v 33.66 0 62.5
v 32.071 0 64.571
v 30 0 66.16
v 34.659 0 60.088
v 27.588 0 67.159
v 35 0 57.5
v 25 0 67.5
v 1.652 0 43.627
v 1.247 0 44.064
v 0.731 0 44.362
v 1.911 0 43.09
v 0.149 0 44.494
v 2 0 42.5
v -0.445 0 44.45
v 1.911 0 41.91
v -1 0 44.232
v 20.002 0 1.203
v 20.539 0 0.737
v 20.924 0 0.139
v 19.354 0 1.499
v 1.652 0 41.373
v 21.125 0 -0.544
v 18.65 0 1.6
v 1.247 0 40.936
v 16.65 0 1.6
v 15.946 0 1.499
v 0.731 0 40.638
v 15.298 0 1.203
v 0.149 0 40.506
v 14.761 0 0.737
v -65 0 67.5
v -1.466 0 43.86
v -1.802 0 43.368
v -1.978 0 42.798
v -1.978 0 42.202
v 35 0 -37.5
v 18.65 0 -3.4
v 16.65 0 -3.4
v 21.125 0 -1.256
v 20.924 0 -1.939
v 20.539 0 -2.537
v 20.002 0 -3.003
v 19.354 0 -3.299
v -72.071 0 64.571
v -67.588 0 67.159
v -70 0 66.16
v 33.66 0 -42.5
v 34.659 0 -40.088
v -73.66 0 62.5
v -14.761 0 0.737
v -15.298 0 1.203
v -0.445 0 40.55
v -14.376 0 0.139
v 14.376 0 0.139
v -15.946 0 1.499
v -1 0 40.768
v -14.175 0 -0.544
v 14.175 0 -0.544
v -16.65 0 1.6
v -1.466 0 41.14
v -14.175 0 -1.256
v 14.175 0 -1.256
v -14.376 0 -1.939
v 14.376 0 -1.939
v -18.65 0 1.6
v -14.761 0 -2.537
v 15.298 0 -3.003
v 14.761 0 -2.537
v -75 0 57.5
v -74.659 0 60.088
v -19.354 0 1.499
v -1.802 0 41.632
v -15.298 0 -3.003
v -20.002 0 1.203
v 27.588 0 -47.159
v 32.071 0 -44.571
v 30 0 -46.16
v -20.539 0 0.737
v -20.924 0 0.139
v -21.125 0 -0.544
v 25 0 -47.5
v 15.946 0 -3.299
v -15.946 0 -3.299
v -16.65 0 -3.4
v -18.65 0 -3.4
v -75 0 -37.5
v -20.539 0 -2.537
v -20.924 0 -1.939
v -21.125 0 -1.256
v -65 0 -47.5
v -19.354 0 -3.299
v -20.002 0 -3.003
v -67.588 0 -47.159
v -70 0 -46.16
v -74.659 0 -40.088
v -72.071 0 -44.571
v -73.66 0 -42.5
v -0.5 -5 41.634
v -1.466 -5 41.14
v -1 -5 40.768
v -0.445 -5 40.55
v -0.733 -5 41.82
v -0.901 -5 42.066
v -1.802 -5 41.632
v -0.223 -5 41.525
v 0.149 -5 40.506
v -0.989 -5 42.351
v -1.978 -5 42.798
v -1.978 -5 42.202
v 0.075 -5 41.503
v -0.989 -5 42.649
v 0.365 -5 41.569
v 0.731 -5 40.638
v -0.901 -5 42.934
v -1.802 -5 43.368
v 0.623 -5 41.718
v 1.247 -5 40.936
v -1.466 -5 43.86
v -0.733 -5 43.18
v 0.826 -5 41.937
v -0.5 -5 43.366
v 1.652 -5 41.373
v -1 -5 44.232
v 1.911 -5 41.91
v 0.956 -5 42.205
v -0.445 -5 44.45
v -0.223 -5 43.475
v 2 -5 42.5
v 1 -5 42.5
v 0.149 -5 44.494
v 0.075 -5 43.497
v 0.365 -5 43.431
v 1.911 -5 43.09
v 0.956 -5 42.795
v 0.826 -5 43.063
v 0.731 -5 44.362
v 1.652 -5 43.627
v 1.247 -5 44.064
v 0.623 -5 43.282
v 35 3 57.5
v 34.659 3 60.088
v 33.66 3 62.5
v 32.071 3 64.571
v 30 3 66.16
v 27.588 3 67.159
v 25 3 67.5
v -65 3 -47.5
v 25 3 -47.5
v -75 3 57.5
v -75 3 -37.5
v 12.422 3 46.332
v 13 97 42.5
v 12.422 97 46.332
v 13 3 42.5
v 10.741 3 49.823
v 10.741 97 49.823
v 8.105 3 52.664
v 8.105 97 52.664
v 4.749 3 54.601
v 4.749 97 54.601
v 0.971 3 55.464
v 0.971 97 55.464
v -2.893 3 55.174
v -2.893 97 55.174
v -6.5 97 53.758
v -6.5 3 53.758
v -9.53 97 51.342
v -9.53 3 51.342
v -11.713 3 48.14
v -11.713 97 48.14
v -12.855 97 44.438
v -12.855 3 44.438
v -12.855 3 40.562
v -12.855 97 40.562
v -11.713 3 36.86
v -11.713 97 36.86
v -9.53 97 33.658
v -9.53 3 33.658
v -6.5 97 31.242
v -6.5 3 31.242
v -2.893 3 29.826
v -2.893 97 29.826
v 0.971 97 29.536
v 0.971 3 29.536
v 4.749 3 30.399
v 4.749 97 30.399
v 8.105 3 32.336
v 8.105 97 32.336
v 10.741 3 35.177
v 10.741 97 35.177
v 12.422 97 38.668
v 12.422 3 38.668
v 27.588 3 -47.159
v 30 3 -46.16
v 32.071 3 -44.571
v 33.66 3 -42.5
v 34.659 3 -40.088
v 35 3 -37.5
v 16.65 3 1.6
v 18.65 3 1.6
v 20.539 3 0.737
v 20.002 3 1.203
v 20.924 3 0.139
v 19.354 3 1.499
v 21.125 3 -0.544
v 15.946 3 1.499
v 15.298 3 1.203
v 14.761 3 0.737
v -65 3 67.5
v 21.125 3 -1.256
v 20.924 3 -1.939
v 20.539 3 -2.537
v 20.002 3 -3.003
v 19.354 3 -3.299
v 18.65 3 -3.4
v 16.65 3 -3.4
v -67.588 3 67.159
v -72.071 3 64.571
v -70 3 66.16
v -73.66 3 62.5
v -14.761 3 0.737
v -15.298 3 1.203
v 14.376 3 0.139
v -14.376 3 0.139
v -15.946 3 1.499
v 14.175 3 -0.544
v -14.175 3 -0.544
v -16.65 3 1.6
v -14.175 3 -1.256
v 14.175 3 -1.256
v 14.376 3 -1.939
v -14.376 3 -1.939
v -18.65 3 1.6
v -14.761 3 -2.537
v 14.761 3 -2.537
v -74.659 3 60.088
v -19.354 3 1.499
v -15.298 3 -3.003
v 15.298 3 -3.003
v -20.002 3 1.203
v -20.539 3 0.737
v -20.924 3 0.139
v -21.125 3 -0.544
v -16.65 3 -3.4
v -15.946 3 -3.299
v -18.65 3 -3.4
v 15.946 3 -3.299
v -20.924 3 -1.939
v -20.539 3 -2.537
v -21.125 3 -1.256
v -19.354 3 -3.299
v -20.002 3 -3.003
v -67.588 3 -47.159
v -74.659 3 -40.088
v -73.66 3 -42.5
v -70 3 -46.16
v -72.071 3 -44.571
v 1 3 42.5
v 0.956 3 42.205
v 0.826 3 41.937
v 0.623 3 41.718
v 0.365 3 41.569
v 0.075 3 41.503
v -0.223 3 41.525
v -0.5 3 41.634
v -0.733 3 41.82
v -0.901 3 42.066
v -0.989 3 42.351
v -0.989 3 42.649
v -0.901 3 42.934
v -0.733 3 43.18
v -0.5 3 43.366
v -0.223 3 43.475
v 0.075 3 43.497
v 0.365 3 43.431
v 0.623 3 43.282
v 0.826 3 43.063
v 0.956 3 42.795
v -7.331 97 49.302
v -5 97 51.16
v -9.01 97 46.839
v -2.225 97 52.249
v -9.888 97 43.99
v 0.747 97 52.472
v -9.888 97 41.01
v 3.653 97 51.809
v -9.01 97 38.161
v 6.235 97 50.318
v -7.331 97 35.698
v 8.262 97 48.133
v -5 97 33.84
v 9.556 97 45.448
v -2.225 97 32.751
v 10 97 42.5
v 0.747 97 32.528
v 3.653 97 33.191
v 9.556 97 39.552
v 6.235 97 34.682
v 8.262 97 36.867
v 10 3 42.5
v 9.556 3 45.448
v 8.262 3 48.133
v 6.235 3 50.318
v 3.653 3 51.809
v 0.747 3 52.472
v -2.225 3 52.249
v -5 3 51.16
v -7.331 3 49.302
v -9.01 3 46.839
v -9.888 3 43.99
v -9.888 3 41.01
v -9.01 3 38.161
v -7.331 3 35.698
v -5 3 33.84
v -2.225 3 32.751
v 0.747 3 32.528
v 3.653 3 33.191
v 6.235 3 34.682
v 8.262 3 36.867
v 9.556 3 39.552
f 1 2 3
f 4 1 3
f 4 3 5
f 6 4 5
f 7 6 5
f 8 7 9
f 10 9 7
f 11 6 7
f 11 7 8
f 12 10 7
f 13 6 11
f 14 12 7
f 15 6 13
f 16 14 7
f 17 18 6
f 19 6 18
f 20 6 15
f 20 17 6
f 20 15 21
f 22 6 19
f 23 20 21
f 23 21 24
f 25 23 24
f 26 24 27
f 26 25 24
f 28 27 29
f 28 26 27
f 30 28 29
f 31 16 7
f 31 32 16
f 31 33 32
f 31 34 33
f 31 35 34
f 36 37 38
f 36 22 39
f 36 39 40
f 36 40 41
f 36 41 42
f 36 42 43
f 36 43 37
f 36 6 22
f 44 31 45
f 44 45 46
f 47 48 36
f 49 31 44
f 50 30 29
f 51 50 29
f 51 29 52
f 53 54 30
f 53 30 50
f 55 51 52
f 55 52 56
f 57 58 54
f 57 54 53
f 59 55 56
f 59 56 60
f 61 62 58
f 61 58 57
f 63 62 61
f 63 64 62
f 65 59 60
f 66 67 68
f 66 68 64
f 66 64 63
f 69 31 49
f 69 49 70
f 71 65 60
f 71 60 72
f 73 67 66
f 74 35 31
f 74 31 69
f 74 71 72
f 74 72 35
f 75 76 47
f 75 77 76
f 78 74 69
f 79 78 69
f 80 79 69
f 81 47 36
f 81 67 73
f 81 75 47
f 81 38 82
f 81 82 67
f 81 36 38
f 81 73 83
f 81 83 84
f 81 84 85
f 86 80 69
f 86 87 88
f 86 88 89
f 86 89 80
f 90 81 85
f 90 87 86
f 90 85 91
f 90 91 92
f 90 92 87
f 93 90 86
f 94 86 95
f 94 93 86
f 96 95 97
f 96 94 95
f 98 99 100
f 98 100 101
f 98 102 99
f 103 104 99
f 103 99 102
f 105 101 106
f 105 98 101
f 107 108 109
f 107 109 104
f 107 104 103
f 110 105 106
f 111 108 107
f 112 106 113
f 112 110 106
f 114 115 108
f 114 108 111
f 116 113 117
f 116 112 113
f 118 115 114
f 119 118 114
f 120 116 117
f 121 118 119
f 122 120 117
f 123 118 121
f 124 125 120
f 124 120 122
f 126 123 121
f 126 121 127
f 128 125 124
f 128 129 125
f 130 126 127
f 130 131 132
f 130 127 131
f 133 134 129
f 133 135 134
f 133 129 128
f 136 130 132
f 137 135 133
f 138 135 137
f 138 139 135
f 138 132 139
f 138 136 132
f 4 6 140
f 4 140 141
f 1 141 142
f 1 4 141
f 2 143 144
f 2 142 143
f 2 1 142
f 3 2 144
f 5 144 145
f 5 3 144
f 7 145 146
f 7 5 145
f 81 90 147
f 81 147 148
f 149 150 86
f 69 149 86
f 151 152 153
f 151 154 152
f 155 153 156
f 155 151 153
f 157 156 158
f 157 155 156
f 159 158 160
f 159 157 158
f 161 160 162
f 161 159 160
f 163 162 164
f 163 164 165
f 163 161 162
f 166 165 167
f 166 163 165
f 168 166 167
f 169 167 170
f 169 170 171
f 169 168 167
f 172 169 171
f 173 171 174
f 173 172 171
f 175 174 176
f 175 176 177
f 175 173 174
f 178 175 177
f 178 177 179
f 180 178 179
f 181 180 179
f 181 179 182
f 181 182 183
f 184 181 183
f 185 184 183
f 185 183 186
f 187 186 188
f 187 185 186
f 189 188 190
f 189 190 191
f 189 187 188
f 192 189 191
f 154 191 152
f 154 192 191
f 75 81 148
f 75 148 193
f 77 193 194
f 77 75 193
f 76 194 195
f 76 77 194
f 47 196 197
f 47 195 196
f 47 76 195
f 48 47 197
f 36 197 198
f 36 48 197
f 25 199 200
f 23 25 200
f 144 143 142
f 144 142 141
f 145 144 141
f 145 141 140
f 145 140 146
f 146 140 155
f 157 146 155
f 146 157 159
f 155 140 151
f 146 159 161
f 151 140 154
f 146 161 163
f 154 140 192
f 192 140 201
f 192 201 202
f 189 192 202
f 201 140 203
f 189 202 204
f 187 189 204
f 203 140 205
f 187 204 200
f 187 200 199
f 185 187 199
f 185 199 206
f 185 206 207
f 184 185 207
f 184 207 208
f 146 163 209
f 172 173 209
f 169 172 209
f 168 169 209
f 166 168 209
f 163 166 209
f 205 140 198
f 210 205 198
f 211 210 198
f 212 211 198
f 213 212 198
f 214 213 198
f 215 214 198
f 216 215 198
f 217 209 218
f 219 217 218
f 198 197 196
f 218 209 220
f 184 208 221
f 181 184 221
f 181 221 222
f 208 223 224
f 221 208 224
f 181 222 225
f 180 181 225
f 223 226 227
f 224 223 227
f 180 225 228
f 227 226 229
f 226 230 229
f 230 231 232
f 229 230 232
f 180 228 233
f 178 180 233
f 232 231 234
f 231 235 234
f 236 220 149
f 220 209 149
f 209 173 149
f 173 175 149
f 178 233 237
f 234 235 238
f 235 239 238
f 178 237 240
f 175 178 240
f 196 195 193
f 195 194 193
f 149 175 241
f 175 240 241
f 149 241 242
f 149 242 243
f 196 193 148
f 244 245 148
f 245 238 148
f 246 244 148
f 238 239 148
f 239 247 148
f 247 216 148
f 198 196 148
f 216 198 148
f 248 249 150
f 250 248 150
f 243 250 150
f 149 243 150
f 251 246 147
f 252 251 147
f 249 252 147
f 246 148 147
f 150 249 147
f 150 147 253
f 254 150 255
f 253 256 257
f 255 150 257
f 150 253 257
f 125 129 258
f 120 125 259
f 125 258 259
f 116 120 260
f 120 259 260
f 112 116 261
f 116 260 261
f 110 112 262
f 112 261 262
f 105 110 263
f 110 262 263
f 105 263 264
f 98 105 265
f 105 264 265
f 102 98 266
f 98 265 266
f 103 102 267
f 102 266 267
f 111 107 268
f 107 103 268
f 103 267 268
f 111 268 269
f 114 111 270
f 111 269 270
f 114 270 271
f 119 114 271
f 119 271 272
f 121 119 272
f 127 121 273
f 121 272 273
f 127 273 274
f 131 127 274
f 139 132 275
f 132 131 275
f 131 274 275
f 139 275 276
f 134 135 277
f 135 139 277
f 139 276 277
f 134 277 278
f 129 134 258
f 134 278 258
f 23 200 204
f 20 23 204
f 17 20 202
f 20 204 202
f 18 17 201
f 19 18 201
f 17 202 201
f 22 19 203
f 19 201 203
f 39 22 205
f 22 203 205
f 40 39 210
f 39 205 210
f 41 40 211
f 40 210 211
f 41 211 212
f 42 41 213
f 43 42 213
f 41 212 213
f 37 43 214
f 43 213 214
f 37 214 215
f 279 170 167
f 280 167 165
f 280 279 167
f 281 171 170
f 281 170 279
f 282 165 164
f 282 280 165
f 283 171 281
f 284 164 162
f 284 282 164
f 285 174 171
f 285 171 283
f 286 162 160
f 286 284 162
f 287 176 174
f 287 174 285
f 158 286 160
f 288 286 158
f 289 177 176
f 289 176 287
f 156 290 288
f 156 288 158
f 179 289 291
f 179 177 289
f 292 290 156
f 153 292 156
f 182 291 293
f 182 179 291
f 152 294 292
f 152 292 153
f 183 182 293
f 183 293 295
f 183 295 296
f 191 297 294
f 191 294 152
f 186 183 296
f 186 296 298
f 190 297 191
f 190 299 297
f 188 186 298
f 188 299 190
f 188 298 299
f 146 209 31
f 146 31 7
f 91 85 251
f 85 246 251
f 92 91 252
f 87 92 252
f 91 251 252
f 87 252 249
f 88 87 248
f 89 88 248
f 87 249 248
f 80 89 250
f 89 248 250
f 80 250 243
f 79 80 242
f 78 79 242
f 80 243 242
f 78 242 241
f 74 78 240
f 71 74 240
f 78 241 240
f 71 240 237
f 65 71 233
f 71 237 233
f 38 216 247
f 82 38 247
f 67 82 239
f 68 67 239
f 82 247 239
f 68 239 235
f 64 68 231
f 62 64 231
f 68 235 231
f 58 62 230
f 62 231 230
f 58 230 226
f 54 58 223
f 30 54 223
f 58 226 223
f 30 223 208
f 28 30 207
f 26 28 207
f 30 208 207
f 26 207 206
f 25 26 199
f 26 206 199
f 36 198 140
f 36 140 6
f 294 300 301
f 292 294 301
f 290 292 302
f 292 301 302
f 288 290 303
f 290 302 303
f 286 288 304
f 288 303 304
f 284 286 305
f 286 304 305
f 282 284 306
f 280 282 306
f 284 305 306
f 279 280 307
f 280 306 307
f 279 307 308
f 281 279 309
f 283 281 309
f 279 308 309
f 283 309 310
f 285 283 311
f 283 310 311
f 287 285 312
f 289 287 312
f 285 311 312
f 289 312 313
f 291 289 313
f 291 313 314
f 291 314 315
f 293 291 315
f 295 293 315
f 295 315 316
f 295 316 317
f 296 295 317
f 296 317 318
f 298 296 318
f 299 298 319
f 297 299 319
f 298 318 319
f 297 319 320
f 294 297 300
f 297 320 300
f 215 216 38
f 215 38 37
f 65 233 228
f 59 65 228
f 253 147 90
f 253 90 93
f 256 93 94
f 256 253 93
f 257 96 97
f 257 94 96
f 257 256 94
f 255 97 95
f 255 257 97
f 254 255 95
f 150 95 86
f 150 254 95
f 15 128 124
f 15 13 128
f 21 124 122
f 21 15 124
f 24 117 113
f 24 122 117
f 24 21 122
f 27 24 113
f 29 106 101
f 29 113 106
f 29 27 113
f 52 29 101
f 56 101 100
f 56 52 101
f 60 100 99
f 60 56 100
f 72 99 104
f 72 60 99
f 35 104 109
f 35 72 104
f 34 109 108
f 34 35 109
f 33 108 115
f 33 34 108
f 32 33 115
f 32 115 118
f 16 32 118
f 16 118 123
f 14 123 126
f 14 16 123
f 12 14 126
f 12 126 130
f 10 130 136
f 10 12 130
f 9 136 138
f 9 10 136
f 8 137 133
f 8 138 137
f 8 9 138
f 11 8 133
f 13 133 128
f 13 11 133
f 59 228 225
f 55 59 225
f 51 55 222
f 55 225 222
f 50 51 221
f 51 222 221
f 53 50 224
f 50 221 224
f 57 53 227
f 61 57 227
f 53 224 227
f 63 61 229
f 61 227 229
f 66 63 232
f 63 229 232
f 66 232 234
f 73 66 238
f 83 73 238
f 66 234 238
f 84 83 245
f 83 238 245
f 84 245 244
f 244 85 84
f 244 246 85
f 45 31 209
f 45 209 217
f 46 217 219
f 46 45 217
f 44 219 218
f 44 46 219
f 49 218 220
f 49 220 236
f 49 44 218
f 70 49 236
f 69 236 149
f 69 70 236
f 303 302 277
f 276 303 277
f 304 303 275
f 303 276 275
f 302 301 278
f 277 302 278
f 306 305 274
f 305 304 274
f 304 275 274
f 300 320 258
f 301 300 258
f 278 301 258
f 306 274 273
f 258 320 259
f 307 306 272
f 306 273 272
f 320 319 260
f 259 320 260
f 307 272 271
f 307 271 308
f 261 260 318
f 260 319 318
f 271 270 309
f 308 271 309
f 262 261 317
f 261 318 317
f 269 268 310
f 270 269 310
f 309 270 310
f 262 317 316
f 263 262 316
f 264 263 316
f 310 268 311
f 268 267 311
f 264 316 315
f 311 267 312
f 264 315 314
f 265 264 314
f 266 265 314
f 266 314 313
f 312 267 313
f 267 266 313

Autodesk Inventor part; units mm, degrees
ref_plane "YZ Plane" through (0, 0, 0) normal (1, 0, 0) x (0, 1, 0)
ref_plane "XZ Plane" through (0, 0, 0) normal (0, 1, 0) x (-1, 0, 0)
ref_plane "XY Plane" through (0, 0, 0) normal (0, 0, 1) x (1, 0, 0)
sketch "Sketch1" plane through (0, 0, 0) normal (0, 1, 0) x (-1, 0, 0)
  line L0 (-75, 47.5) -> (75, 47.5)
  line L1 (75, 47.5) -> (75, -47.5)
  line L2 (75, -47.5) -> (-75, -47.5)
  line L3 (-75, -47.5) -> (-75, 47.5)
  line L4 (-75, 47.5) -> (75, -47.5) construction
  line L5 (75, 47.5) -> (-75, -47.5) construction
  point P0 (0, 0)
  dimension "d0" = 150
  dimension "d1" = 95
extrude "Extrusion1" add sketch "Sketch1" along normal blind 3
sketch "Sketch6" plane through (0, 3, 0) normal (0, 1, 0) x (1, 0, 0)
  line L0 (75, 47.5) -> (-75, 47.5) projected
  line L1 (0, 47.5) -> (0, 22.5)
  line L2 (0, 22.5) -> (0, -20.7)
  line L3 (0, -20.7) -> (0, 0.9)
  line L4 (0, 0.9) -> (-53.4, 0.9)
  line L5 (-18.65, 0.9) -> (18.65, 0.9)
  circle A0 centre (18.65, 0.9) radius 2.5
  circle A1 centre (-18.65, 0.9) radius 2.5
  line L6 (-18.65, 0.9) -> (-16.65, 0.9)
  line L7 (18.65, 0.9) -> (16.65, 0.9)
  circle A2 centre (16.65, 0.9) radius 2.5
  circle A3 centre (-16.65, 0.9) radius 2.5
  line L8 (-18.65, 3.4) -> (-16.65, 3.4)
  line L9 (-18.65, -1.6) -> (-16.65, -1.6)
  line L10 (16.65, 3.4) -> (18.65, 3.4)
  line L11 (16.65, -1.6) -> (18.65, -1.6)
  point P0 (0, 0)
  dimension "d40" = 25
  dimension "d41" = 43.2
  dimension "d42" = 53.4
  dimension "d46" = 37.3
  dimension "d47" = 5
  dimension "d48" = 5
  dimension "d49" = 2
  dimension "d50" = 2
  dimension "d51" = 5
  dimension "d52" = 5
extrude "Extrusion6" cut sketch "Sketch6" against normal through all
sketch "Sketch7" plane through (0, 3, 0) normal (0, 1, 0) x (1, 0, 0)
  line L0 (75, 47.5) -> (-75, 47.5) projected
  line L1 (-75, -47.5) -> (75, -47.5) projected
  line L2 (75, 47.5) -> (35, 47.5)
  line L3 (35, 47.5) -> (35, -47.5)
  line L4 (35, -47.5) -> (75, -47.5)
  line L5 (75, -47.5) -> (75, 47.5)
  point P0 (0, 0)
  point P1 (75, -47.5)
  dimension "d55" = 40
extrude "Extrusion7" cut sketch "Sketch7" against normal through all
sketch "Sketch8" plane through (0, 3, 0) normal (0, 1, 0) x (1, 0, 0)
  line L0 (-75, -47.5) -> (35, -47.5) projected
  line L1 (35, 47.5) -> (-75, 47.5) projected
  line L2 (0, 47.5) -> (0, -42.5)
  circle A0 centre (0, -42.5) radius 13
  line L3 (0, -42.5) -> (-20, -42.5)
  circle A1 centre (-20, -42.5) radius 1.5
  circle A2 centre (-10, -59.8205) radius 1.5
  circle A3 centre (10, -59.8205) radius 1.5
  circle A4 centre (20, -42.5) radius 1.5
  circle A5 centre (10, -25.1795) radius 1.5
  circle A6 centre (-10, -25.1795) radius 1.5
  circle A7 centre (0, -42.5) radius 10
  point P0 (0, 0)
  point P1 (7, 47.5)
  point P2 (-7, 47.5)
  point P3 (-10, -42.5)
  point P4 (-10, -47.5)
  point P5 (10, -42.5)
  point P6 (10, -47.5)
  point P7 (8.6603, -47.5)
  point P8 (-8.6603, -47.5)
  dimension "d60" = 90
  dimension "d62" = 26
  dimension "d63" = 20
  dimension "d64" = 3
  dimension "d67" = 360
  dimension "d69" = 20
sketch "Sketch9" plane through (-75, 0, 47.5) normal (0, 0, 1) x (1, 0, 0)
  line L0 (110, 0) -> (0, 0) projected
  line L1 (110, 3) -> (110, 0) projected
  line L2 (0, 0) -> (110, 0)
  line L3 (110, 0) -> (110, 3)
  line L4 (110, 3) -> (0, 3)
  line L5 (0, 3) -> (0, 0)
  point P0 (75, 0)
extrude "Extrusion9" add sketch "Sketch9" along normal blind 20
extrude "Extrusion10" add sketch "Sketch8" along normal blind 94 contours A0 L3 A7 L0 | L0 A7 A0 | A0 L2 A7 L3 | L0 A7 L2 A0
sketch "Sketch10" plane through (0, 3, 42.5) normal (0, 1, 0) x (1, 0, 0)
  circle A0 centre (0, 0) radius 1
  point P0 (0, 42.5)
  dimension "d77" = 2
extrude "Extrusion11" cut sketch "Sketch10" against normal through all
sketch "Sketch11" plane through (0, 0, 0) normal (0, -1, 0) x (1, 0, 0)
  circle A0 centre (0, 42.5) radius 1 projected
  circle A1 centre (0, 42.5) radius 1
  circle A2 centre (0, 42.5) radius 2
  point P0 (0, 0)
  dimension "d80" = 4
extrude "Extrusion12" add sketch "Sketch11" along normal blind 5
thread "Thread1" size "M4x0.7" class "6g" standard "ISO Metric profile" full length
fillet "Fillet2" radius 10 4 edges at (35, 1.5, 67.5) (35, 1.5, -47.5) (-75, 1.5, 67.5) (-75, 1.5, -47.5)
properties part number "TopMount"
